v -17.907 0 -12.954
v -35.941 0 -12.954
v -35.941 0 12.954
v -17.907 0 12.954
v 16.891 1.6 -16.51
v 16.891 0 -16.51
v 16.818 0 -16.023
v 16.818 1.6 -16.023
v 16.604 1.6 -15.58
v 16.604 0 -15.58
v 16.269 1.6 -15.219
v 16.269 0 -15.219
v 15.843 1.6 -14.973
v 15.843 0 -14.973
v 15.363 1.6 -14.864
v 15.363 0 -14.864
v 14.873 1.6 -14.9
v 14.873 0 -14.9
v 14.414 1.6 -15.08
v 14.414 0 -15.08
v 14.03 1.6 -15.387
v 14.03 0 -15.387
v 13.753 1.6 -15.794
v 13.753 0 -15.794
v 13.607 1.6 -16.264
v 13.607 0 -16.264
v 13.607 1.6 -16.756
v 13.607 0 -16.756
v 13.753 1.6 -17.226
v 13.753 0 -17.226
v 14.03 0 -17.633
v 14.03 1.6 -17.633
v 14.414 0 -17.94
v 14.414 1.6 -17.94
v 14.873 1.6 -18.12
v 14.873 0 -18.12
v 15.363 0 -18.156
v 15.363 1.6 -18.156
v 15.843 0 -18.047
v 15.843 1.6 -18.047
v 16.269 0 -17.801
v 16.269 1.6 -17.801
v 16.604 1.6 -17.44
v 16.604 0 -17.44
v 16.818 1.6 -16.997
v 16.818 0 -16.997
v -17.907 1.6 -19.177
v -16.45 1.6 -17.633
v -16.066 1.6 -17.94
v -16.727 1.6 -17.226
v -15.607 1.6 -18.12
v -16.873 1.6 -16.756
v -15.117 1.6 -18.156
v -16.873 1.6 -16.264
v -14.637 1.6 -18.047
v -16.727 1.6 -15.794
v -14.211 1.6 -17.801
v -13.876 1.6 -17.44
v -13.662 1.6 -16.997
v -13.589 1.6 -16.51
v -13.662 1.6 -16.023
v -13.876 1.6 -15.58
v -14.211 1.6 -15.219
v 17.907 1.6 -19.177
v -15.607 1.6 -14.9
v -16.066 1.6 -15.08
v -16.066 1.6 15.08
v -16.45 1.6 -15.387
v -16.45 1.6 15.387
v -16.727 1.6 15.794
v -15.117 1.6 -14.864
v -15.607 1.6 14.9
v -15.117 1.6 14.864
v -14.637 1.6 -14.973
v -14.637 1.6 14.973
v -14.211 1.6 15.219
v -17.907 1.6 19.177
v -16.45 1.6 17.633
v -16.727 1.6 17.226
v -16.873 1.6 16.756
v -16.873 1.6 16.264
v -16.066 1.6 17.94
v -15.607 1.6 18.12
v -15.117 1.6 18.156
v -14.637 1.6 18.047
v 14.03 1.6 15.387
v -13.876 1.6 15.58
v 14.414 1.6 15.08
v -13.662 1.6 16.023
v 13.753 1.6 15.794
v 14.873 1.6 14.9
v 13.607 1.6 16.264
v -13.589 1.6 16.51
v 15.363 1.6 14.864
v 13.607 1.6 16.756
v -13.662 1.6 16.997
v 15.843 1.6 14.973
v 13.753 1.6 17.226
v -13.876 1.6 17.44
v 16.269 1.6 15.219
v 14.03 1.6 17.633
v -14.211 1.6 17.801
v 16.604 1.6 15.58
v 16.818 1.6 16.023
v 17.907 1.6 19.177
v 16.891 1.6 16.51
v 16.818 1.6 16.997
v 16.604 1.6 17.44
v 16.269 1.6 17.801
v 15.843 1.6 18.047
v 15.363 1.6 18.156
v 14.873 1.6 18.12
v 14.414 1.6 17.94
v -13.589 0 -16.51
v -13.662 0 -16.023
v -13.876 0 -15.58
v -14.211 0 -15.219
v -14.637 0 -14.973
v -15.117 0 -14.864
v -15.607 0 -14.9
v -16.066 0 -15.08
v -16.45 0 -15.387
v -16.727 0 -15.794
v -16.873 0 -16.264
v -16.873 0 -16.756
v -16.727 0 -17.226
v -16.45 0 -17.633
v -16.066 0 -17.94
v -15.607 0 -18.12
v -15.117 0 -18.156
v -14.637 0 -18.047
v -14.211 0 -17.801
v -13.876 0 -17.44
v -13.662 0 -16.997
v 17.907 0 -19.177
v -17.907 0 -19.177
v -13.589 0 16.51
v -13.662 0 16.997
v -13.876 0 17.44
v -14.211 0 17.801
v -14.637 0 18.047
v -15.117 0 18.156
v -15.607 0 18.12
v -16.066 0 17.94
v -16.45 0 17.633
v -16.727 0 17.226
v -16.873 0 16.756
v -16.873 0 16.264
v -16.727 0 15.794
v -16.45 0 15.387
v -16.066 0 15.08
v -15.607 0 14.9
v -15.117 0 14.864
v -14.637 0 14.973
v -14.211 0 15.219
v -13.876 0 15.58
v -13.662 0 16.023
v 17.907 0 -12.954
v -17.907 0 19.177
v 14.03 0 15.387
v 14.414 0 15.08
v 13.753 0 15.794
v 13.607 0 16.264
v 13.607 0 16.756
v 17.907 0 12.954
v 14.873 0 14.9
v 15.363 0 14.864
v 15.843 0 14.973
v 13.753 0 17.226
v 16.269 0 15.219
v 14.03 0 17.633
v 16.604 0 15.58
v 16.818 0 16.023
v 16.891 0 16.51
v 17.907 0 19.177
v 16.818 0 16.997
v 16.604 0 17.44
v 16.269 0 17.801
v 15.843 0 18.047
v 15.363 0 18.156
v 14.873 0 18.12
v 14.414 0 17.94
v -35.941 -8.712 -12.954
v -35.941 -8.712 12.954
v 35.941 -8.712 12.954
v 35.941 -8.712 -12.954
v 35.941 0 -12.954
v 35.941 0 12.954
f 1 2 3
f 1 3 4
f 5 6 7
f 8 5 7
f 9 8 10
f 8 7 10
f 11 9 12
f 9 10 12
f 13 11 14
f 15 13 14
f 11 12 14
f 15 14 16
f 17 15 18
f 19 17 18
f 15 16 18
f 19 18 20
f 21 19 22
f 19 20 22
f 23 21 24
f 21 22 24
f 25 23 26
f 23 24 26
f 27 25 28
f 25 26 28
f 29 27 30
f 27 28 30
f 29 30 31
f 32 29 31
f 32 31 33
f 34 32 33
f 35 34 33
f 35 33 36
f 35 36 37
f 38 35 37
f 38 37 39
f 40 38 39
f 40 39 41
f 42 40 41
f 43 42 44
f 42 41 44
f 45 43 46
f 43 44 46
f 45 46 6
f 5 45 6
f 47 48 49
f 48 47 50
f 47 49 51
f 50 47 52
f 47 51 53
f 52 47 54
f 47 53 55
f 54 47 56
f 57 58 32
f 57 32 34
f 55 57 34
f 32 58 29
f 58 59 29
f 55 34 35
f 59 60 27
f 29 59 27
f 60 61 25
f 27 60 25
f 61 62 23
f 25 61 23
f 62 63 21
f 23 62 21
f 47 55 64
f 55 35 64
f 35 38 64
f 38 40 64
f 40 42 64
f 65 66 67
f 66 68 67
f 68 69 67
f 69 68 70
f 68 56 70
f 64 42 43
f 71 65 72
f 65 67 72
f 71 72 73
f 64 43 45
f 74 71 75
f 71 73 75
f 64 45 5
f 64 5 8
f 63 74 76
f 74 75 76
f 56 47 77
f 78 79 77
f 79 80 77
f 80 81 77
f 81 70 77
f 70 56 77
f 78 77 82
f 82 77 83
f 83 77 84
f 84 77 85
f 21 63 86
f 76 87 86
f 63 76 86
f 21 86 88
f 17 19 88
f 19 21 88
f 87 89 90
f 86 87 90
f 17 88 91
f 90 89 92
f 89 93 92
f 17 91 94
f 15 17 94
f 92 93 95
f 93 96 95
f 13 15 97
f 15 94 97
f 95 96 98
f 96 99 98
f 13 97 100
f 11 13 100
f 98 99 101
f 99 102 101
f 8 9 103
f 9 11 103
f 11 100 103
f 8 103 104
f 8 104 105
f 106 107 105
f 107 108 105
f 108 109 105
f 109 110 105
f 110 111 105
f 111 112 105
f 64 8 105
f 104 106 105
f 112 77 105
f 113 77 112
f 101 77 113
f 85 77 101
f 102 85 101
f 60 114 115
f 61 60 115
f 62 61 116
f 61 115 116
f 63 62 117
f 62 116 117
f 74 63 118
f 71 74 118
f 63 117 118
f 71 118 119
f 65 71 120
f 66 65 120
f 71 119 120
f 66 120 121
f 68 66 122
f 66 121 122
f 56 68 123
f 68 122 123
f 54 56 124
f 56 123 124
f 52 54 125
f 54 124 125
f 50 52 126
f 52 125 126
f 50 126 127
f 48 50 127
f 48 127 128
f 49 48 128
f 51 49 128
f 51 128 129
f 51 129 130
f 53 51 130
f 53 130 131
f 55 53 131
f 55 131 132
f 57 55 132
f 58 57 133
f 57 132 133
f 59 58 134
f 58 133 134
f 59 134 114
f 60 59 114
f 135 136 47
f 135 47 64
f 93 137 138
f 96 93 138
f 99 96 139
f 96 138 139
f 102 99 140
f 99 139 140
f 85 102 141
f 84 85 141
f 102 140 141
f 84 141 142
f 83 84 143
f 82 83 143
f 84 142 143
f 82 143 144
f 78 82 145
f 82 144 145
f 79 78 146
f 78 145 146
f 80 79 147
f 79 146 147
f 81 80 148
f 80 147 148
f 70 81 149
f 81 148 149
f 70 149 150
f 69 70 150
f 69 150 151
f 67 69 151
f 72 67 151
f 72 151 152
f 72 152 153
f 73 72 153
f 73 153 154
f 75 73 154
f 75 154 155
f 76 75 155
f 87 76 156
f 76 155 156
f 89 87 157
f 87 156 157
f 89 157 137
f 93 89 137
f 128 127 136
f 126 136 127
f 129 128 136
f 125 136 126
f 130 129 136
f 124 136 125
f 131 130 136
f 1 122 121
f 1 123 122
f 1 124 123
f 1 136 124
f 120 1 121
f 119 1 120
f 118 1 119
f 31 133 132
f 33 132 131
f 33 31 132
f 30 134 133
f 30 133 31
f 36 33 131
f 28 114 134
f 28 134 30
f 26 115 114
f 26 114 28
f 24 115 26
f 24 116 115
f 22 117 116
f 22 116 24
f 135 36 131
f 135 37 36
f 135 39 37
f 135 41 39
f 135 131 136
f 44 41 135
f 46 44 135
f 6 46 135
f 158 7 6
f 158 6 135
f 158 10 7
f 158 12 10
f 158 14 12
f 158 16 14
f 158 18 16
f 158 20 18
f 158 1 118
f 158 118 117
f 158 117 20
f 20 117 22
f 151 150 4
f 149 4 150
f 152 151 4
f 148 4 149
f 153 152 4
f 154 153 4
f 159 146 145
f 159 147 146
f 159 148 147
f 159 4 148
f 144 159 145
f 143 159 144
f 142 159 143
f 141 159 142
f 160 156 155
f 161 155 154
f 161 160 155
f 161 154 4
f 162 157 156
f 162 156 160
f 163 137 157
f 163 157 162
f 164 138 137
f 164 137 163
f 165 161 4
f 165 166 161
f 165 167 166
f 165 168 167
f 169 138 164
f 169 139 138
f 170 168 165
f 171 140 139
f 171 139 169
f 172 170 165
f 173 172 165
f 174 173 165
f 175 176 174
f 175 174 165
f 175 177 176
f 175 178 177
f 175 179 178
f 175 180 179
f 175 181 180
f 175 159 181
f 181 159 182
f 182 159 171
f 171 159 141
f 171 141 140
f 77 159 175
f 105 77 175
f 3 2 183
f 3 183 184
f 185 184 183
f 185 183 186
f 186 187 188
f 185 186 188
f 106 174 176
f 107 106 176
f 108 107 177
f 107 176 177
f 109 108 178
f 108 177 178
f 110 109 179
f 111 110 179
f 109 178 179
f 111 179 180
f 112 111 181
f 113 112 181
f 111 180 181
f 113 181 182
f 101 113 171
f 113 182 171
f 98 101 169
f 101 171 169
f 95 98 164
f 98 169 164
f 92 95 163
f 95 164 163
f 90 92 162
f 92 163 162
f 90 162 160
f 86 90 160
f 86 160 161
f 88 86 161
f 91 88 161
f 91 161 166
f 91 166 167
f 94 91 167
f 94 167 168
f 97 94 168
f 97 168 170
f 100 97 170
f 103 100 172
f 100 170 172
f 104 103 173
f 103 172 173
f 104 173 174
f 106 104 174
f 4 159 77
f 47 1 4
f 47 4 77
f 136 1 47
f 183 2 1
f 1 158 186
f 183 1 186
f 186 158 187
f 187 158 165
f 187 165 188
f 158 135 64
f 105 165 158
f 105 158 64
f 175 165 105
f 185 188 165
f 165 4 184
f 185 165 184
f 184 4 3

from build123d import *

# Parameters (mm, degrees)
F0_W     = 18.034
F0_H     = 25.908
F0_W_2   = 35.814
F1_DEPTH = 8.7122
F0_H_2   = 6.223
F0_R     = 1.651
F2_DEPTH = 1.6002


with BuildPart() as f1:
    # F0 (on Front) → F1 (new body)
    with BuildSketch(Plane.XZ):
        with Locations((-26.924, 0)):
            Rectangle(F0_W, F0_H)
        Rectangle(F0_W_2, F0_H)
        with Locations((26.924, 0)):
            Rectangle(F0_W, F0_H)
    extrude(amount=F1_DEPTH)

    # F0 (on Front) → F2 (join)
    with BuildSketch(Plane.XZ):
        Rectangle(F0_W_2, F0_H)
        with Locations((0, -16.0655)):
            Rectangle(F0_W_2, F0_H_2)
        with Locations((-15.24, -16.51)):
            Circle(F0_R, mode=Mode.SUBTRACT)
        with Locations((15.24, -16.51)):
            Circle(F0_R, mode=Mode.SUBTRACT)
        with Locations((0, 16.0655)):
            Rectangle(F0_W_2, F0_H_2)
        with Locations((-15.24, 16.51)):
            Circle(F0_R, mode=Mode.SUBTRACT)
        with Locations((15.24, 16.51)):
            Circle(F0_R, mode=Mode.SUBTRACT)
    extrude(amount=-F2_DEPTH)


solid = f1.part
